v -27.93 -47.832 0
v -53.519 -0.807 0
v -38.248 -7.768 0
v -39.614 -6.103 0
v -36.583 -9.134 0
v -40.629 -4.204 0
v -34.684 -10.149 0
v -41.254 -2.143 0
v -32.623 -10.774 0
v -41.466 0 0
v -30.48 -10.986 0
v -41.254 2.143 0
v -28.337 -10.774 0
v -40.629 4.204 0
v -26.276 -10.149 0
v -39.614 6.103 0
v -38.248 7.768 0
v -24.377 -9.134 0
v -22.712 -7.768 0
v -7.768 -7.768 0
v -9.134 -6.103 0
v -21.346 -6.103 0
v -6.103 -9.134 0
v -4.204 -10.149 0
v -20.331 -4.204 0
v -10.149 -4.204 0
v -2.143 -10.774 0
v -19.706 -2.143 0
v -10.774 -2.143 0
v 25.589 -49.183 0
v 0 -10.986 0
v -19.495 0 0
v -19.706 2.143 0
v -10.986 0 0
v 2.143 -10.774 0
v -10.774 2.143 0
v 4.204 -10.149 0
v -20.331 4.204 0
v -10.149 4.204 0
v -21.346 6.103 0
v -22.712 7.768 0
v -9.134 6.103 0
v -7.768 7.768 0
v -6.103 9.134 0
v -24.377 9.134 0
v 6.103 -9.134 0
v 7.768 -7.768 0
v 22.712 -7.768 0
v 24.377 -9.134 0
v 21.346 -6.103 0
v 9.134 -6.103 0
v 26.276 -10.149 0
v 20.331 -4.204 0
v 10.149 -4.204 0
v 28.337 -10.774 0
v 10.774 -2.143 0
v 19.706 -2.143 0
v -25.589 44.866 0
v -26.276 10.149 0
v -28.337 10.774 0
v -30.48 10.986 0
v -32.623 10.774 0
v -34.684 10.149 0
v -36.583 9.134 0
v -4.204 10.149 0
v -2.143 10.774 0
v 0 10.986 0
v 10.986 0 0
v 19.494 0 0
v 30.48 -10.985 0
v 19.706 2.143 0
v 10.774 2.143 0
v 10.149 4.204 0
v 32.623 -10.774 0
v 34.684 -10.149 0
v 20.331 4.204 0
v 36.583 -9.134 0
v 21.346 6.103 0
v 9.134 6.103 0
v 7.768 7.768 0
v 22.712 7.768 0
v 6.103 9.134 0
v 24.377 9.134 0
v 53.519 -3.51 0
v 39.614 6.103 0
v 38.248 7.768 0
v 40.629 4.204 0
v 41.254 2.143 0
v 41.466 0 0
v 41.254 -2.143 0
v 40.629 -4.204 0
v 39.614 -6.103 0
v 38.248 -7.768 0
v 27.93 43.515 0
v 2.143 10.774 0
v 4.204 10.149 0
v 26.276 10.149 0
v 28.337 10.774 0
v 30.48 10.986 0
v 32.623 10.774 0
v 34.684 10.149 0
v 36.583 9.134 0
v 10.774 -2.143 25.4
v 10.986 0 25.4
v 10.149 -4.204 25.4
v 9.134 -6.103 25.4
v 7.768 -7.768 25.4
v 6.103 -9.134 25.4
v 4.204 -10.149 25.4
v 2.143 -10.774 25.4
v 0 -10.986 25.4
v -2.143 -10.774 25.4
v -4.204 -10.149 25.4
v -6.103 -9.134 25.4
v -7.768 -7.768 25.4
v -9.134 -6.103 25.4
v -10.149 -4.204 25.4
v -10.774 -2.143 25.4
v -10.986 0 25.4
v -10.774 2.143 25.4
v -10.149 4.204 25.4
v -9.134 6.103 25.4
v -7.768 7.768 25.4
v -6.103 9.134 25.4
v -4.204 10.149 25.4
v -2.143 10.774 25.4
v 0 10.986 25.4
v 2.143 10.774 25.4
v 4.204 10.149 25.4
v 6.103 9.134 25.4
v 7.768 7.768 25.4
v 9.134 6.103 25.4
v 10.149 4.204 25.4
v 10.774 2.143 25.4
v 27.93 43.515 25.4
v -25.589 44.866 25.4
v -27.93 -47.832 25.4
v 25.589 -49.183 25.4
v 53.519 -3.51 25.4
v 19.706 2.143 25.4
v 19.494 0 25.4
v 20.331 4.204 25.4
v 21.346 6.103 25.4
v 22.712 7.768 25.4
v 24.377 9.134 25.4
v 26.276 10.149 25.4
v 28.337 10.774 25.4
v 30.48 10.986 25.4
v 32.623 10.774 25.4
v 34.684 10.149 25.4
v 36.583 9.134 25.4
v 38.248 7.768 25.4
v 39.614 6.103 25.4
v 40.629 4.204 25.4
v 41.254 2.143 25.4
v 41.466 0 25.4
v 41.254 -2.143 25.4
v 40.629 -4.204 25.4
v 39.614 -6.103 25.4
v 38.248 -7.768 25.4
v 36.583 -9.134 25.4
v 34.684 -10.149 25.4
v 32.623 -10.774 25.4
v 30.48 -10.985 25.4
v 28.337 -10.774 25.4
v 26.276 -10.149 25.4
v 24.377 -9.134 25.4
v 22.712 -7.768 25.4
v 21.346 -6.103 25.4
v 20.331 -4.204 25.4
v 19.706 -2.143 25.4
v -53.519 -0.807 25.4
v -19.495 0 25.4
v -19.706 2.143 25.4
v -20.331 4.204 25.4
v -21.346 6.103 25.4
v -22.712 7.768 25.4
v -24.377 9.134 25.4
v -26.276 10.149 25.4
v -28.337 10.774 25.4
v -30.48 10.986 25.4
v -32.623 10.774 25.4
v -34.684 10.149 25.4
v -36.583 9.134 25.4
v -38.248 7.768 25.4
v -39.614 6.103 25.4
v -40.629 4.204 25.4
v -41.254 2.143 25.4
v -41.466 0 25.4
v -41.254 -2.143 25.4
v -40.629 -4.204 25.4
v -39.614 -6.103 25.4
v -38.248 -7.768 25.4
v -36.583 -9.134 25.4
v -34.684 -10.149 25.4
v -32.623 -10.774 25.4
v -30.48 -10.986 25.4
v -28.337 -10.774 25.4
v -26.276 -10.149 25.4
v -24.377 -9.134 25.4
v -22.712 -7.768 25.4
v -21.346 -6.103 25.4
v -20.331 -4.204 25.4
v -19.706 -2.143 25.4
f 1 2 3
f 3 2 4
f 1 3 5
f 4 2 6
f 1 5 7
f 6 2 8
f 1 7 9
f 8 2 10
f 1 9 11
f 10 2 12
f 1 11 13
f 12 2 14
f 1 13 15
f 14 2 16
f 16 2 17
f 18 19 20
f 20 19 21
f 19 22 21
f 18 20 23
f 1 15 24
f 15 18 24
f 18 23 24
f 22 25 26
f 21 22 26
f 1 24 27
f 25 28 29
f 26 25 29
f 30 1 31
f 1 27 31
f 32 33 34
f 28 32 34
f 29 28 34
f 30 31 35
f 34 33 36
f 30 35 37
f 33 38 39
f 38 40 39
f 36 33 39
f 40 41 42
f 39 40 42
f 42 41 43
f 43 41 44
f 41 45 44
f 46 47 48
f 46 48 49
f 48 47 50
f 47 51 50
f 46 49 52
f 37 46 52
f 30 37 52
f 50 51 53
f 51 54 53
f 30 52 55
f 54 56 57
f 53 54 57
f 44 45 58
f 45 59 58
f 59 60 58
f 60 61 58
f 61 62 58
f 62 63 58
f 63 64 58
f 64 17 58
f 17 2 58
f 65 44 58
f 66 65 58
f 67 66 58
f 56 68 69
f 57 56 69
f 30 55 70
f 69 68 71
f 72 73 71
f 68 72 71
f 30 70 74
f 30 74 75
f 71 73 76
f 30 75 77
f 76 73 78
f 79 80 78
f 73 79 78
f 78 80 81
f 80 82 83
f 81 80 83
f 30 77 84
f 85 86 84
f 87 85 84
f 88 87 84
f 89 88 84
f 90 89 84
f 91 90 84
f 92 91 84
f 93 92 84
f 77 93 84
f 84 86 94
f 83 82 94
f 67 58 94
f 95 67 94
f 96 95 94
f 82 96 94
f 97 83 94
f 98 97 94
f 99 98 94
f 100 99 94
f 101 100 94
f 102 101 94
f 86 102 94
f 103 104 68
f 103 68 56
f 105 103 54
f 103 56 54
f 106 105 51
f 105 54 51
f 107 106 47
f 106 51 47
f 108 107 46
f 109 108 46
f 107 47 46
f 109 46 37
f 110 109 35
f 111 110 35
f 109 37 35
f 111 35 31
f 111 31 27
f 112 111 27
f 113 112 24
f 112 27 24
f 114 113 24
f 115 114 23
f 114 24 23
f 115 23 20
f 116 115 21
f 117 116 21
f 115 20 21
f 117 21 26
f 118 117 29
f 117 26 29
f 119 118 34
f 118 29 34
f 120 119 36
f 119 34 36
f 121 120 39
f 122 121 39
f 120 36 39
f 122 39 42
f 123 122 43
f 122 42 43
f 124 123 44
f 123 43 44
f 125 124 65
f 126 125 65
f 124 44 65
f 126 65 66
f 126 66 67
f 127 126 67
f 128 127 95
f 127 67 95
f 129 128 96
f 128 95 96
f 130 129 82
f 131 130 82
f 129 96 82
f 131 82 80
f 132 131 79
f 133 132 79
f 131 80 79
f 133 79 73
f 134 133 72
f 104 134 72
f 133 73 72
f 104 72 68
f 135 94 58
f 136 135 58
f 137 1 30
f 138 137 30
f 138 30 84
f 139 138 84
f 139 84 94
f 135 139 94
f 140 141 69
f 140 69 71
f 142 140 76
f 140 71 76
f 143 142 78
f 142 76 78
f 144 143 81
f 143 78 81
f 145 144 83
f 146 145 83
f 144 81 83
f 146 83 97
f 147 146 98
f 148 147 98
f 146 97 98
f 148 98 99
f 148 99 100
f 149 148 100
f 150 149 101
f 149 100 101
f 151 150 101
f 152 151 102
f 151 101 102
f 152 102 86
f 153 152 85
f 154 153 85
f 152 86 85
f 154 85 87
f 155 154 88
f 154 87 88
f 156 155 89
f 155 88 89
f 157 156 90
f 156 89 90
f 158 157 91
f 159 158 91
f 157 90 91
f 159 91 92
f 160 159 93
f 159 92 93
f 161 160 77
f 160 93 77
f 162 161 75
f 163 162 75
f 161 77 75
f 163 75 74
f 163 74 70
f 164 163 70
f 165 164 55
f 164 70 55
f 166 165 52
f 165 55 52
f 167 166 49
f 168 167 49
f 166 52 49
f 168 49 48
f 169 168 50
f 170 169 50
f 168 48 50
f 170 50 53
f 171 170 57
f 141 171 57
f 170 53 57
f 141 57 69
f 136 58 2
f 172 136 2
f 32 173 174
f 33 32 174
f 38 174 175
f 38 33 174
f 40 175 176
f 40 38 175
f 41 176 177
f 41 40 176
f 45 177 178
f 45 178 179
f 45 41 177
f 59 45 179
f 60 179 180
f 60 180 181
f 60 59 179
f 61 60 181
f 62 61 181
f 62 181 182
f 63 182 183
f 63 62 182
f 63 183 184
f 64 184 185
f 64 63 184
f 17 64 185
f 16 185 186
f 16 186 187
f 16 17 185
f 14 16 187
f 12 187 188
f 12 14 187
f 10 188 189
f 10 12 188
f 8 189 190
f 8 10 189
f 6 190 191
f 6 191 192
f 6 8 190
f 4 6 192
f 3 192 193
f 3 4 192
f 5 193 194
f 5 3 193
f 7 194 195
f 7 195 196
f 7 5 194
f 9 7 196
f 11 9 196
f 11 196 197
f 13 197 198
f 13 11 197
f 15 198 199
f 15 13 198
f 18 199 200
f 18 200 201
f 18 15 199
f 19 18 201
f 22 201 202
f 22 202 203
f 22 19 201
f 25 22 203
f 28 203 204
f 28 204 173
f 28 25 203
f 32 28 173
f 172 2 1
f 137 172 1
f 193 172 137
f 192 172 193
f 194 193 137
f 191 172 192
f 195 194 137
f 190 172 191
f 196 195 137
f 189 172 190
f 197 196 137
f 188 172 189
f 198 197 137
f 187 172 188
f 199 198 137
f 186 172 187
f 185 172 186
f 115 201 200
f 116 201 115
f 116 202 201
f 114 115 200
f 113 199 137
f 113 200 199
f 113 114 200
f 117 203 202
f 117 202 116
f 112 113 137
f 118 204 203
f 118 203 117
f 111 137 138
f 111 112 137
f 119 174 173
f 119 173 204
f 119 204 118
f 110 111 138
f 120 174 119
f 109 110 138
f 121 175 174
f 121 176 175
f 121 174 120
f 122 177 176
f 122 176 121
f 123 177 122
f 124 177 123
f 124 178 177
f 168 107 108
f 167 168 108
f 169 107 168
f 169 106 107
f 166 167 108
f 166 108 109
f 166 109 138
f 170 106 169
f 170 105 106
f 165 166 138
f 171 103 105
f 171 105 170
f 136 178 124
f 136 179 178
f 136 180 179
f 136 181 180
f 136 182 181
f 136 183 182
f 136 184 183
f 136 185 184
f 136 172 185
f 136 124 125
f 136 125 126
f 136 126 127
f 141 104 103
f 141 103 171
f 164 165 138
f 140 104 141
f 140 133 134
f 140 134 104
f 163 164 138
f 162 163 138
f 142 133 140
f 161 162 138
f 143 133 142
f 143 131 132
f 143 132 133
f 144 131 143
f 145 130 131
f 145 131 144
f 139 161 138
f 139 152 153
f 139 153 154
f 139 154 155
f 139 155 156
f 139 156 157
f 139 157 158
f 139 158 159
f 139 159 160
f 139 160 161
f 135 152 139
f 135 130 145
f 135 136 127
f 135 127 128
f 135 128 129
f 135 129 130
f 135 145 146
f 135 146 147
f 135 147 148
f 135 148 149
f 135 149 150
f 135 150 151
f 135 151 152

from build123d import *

# Parameters (mm, degrees)
F0_R     = 10.9855
F1_DEPTH = 25.4


# Not quite as in the source:
# - a feature names something its author has since deleted; it is built from what else it names


with BuildPart() as f1:
    # F0 (on Top) → F1 (new body)
    with BuildSketch(Plane.XY):
        Polygon((53.519200738, -3.5098091407), (27.9298310918, 43.5148113115), (-25.5893696461, 44.8660773572), (-53.519200738, -0.8072770493), (-27.9298310918, -47.8318975015), (25.5893696461, -49.1831635472), align=None)
        with Locations((-30.48, 0)):
            Circle(F0_R, mode=Mode.SUBTRACT)
        with BuildLine():
            ThreePointArc((-10.9855, 0), (0, 10.9855), (10.9855, 0))
            ThreePointArc((10.9855, 0), (0, -10.9855), (-10.9855, 0))
        make_face(mode=Mode.SUBTRACT)
        with BuildLine():
            ThreePointArc((41.4655, 0), (30.48, -10.9855), (19.4945, 0))
            ThreePointArc((19.4945, 0), (30.48, 10.9855), (41.4655, 0))
        make_face(mode=Mode.SUBTRACT)
    extrude(amount=F1_DEPTH)


solid = f1.part
